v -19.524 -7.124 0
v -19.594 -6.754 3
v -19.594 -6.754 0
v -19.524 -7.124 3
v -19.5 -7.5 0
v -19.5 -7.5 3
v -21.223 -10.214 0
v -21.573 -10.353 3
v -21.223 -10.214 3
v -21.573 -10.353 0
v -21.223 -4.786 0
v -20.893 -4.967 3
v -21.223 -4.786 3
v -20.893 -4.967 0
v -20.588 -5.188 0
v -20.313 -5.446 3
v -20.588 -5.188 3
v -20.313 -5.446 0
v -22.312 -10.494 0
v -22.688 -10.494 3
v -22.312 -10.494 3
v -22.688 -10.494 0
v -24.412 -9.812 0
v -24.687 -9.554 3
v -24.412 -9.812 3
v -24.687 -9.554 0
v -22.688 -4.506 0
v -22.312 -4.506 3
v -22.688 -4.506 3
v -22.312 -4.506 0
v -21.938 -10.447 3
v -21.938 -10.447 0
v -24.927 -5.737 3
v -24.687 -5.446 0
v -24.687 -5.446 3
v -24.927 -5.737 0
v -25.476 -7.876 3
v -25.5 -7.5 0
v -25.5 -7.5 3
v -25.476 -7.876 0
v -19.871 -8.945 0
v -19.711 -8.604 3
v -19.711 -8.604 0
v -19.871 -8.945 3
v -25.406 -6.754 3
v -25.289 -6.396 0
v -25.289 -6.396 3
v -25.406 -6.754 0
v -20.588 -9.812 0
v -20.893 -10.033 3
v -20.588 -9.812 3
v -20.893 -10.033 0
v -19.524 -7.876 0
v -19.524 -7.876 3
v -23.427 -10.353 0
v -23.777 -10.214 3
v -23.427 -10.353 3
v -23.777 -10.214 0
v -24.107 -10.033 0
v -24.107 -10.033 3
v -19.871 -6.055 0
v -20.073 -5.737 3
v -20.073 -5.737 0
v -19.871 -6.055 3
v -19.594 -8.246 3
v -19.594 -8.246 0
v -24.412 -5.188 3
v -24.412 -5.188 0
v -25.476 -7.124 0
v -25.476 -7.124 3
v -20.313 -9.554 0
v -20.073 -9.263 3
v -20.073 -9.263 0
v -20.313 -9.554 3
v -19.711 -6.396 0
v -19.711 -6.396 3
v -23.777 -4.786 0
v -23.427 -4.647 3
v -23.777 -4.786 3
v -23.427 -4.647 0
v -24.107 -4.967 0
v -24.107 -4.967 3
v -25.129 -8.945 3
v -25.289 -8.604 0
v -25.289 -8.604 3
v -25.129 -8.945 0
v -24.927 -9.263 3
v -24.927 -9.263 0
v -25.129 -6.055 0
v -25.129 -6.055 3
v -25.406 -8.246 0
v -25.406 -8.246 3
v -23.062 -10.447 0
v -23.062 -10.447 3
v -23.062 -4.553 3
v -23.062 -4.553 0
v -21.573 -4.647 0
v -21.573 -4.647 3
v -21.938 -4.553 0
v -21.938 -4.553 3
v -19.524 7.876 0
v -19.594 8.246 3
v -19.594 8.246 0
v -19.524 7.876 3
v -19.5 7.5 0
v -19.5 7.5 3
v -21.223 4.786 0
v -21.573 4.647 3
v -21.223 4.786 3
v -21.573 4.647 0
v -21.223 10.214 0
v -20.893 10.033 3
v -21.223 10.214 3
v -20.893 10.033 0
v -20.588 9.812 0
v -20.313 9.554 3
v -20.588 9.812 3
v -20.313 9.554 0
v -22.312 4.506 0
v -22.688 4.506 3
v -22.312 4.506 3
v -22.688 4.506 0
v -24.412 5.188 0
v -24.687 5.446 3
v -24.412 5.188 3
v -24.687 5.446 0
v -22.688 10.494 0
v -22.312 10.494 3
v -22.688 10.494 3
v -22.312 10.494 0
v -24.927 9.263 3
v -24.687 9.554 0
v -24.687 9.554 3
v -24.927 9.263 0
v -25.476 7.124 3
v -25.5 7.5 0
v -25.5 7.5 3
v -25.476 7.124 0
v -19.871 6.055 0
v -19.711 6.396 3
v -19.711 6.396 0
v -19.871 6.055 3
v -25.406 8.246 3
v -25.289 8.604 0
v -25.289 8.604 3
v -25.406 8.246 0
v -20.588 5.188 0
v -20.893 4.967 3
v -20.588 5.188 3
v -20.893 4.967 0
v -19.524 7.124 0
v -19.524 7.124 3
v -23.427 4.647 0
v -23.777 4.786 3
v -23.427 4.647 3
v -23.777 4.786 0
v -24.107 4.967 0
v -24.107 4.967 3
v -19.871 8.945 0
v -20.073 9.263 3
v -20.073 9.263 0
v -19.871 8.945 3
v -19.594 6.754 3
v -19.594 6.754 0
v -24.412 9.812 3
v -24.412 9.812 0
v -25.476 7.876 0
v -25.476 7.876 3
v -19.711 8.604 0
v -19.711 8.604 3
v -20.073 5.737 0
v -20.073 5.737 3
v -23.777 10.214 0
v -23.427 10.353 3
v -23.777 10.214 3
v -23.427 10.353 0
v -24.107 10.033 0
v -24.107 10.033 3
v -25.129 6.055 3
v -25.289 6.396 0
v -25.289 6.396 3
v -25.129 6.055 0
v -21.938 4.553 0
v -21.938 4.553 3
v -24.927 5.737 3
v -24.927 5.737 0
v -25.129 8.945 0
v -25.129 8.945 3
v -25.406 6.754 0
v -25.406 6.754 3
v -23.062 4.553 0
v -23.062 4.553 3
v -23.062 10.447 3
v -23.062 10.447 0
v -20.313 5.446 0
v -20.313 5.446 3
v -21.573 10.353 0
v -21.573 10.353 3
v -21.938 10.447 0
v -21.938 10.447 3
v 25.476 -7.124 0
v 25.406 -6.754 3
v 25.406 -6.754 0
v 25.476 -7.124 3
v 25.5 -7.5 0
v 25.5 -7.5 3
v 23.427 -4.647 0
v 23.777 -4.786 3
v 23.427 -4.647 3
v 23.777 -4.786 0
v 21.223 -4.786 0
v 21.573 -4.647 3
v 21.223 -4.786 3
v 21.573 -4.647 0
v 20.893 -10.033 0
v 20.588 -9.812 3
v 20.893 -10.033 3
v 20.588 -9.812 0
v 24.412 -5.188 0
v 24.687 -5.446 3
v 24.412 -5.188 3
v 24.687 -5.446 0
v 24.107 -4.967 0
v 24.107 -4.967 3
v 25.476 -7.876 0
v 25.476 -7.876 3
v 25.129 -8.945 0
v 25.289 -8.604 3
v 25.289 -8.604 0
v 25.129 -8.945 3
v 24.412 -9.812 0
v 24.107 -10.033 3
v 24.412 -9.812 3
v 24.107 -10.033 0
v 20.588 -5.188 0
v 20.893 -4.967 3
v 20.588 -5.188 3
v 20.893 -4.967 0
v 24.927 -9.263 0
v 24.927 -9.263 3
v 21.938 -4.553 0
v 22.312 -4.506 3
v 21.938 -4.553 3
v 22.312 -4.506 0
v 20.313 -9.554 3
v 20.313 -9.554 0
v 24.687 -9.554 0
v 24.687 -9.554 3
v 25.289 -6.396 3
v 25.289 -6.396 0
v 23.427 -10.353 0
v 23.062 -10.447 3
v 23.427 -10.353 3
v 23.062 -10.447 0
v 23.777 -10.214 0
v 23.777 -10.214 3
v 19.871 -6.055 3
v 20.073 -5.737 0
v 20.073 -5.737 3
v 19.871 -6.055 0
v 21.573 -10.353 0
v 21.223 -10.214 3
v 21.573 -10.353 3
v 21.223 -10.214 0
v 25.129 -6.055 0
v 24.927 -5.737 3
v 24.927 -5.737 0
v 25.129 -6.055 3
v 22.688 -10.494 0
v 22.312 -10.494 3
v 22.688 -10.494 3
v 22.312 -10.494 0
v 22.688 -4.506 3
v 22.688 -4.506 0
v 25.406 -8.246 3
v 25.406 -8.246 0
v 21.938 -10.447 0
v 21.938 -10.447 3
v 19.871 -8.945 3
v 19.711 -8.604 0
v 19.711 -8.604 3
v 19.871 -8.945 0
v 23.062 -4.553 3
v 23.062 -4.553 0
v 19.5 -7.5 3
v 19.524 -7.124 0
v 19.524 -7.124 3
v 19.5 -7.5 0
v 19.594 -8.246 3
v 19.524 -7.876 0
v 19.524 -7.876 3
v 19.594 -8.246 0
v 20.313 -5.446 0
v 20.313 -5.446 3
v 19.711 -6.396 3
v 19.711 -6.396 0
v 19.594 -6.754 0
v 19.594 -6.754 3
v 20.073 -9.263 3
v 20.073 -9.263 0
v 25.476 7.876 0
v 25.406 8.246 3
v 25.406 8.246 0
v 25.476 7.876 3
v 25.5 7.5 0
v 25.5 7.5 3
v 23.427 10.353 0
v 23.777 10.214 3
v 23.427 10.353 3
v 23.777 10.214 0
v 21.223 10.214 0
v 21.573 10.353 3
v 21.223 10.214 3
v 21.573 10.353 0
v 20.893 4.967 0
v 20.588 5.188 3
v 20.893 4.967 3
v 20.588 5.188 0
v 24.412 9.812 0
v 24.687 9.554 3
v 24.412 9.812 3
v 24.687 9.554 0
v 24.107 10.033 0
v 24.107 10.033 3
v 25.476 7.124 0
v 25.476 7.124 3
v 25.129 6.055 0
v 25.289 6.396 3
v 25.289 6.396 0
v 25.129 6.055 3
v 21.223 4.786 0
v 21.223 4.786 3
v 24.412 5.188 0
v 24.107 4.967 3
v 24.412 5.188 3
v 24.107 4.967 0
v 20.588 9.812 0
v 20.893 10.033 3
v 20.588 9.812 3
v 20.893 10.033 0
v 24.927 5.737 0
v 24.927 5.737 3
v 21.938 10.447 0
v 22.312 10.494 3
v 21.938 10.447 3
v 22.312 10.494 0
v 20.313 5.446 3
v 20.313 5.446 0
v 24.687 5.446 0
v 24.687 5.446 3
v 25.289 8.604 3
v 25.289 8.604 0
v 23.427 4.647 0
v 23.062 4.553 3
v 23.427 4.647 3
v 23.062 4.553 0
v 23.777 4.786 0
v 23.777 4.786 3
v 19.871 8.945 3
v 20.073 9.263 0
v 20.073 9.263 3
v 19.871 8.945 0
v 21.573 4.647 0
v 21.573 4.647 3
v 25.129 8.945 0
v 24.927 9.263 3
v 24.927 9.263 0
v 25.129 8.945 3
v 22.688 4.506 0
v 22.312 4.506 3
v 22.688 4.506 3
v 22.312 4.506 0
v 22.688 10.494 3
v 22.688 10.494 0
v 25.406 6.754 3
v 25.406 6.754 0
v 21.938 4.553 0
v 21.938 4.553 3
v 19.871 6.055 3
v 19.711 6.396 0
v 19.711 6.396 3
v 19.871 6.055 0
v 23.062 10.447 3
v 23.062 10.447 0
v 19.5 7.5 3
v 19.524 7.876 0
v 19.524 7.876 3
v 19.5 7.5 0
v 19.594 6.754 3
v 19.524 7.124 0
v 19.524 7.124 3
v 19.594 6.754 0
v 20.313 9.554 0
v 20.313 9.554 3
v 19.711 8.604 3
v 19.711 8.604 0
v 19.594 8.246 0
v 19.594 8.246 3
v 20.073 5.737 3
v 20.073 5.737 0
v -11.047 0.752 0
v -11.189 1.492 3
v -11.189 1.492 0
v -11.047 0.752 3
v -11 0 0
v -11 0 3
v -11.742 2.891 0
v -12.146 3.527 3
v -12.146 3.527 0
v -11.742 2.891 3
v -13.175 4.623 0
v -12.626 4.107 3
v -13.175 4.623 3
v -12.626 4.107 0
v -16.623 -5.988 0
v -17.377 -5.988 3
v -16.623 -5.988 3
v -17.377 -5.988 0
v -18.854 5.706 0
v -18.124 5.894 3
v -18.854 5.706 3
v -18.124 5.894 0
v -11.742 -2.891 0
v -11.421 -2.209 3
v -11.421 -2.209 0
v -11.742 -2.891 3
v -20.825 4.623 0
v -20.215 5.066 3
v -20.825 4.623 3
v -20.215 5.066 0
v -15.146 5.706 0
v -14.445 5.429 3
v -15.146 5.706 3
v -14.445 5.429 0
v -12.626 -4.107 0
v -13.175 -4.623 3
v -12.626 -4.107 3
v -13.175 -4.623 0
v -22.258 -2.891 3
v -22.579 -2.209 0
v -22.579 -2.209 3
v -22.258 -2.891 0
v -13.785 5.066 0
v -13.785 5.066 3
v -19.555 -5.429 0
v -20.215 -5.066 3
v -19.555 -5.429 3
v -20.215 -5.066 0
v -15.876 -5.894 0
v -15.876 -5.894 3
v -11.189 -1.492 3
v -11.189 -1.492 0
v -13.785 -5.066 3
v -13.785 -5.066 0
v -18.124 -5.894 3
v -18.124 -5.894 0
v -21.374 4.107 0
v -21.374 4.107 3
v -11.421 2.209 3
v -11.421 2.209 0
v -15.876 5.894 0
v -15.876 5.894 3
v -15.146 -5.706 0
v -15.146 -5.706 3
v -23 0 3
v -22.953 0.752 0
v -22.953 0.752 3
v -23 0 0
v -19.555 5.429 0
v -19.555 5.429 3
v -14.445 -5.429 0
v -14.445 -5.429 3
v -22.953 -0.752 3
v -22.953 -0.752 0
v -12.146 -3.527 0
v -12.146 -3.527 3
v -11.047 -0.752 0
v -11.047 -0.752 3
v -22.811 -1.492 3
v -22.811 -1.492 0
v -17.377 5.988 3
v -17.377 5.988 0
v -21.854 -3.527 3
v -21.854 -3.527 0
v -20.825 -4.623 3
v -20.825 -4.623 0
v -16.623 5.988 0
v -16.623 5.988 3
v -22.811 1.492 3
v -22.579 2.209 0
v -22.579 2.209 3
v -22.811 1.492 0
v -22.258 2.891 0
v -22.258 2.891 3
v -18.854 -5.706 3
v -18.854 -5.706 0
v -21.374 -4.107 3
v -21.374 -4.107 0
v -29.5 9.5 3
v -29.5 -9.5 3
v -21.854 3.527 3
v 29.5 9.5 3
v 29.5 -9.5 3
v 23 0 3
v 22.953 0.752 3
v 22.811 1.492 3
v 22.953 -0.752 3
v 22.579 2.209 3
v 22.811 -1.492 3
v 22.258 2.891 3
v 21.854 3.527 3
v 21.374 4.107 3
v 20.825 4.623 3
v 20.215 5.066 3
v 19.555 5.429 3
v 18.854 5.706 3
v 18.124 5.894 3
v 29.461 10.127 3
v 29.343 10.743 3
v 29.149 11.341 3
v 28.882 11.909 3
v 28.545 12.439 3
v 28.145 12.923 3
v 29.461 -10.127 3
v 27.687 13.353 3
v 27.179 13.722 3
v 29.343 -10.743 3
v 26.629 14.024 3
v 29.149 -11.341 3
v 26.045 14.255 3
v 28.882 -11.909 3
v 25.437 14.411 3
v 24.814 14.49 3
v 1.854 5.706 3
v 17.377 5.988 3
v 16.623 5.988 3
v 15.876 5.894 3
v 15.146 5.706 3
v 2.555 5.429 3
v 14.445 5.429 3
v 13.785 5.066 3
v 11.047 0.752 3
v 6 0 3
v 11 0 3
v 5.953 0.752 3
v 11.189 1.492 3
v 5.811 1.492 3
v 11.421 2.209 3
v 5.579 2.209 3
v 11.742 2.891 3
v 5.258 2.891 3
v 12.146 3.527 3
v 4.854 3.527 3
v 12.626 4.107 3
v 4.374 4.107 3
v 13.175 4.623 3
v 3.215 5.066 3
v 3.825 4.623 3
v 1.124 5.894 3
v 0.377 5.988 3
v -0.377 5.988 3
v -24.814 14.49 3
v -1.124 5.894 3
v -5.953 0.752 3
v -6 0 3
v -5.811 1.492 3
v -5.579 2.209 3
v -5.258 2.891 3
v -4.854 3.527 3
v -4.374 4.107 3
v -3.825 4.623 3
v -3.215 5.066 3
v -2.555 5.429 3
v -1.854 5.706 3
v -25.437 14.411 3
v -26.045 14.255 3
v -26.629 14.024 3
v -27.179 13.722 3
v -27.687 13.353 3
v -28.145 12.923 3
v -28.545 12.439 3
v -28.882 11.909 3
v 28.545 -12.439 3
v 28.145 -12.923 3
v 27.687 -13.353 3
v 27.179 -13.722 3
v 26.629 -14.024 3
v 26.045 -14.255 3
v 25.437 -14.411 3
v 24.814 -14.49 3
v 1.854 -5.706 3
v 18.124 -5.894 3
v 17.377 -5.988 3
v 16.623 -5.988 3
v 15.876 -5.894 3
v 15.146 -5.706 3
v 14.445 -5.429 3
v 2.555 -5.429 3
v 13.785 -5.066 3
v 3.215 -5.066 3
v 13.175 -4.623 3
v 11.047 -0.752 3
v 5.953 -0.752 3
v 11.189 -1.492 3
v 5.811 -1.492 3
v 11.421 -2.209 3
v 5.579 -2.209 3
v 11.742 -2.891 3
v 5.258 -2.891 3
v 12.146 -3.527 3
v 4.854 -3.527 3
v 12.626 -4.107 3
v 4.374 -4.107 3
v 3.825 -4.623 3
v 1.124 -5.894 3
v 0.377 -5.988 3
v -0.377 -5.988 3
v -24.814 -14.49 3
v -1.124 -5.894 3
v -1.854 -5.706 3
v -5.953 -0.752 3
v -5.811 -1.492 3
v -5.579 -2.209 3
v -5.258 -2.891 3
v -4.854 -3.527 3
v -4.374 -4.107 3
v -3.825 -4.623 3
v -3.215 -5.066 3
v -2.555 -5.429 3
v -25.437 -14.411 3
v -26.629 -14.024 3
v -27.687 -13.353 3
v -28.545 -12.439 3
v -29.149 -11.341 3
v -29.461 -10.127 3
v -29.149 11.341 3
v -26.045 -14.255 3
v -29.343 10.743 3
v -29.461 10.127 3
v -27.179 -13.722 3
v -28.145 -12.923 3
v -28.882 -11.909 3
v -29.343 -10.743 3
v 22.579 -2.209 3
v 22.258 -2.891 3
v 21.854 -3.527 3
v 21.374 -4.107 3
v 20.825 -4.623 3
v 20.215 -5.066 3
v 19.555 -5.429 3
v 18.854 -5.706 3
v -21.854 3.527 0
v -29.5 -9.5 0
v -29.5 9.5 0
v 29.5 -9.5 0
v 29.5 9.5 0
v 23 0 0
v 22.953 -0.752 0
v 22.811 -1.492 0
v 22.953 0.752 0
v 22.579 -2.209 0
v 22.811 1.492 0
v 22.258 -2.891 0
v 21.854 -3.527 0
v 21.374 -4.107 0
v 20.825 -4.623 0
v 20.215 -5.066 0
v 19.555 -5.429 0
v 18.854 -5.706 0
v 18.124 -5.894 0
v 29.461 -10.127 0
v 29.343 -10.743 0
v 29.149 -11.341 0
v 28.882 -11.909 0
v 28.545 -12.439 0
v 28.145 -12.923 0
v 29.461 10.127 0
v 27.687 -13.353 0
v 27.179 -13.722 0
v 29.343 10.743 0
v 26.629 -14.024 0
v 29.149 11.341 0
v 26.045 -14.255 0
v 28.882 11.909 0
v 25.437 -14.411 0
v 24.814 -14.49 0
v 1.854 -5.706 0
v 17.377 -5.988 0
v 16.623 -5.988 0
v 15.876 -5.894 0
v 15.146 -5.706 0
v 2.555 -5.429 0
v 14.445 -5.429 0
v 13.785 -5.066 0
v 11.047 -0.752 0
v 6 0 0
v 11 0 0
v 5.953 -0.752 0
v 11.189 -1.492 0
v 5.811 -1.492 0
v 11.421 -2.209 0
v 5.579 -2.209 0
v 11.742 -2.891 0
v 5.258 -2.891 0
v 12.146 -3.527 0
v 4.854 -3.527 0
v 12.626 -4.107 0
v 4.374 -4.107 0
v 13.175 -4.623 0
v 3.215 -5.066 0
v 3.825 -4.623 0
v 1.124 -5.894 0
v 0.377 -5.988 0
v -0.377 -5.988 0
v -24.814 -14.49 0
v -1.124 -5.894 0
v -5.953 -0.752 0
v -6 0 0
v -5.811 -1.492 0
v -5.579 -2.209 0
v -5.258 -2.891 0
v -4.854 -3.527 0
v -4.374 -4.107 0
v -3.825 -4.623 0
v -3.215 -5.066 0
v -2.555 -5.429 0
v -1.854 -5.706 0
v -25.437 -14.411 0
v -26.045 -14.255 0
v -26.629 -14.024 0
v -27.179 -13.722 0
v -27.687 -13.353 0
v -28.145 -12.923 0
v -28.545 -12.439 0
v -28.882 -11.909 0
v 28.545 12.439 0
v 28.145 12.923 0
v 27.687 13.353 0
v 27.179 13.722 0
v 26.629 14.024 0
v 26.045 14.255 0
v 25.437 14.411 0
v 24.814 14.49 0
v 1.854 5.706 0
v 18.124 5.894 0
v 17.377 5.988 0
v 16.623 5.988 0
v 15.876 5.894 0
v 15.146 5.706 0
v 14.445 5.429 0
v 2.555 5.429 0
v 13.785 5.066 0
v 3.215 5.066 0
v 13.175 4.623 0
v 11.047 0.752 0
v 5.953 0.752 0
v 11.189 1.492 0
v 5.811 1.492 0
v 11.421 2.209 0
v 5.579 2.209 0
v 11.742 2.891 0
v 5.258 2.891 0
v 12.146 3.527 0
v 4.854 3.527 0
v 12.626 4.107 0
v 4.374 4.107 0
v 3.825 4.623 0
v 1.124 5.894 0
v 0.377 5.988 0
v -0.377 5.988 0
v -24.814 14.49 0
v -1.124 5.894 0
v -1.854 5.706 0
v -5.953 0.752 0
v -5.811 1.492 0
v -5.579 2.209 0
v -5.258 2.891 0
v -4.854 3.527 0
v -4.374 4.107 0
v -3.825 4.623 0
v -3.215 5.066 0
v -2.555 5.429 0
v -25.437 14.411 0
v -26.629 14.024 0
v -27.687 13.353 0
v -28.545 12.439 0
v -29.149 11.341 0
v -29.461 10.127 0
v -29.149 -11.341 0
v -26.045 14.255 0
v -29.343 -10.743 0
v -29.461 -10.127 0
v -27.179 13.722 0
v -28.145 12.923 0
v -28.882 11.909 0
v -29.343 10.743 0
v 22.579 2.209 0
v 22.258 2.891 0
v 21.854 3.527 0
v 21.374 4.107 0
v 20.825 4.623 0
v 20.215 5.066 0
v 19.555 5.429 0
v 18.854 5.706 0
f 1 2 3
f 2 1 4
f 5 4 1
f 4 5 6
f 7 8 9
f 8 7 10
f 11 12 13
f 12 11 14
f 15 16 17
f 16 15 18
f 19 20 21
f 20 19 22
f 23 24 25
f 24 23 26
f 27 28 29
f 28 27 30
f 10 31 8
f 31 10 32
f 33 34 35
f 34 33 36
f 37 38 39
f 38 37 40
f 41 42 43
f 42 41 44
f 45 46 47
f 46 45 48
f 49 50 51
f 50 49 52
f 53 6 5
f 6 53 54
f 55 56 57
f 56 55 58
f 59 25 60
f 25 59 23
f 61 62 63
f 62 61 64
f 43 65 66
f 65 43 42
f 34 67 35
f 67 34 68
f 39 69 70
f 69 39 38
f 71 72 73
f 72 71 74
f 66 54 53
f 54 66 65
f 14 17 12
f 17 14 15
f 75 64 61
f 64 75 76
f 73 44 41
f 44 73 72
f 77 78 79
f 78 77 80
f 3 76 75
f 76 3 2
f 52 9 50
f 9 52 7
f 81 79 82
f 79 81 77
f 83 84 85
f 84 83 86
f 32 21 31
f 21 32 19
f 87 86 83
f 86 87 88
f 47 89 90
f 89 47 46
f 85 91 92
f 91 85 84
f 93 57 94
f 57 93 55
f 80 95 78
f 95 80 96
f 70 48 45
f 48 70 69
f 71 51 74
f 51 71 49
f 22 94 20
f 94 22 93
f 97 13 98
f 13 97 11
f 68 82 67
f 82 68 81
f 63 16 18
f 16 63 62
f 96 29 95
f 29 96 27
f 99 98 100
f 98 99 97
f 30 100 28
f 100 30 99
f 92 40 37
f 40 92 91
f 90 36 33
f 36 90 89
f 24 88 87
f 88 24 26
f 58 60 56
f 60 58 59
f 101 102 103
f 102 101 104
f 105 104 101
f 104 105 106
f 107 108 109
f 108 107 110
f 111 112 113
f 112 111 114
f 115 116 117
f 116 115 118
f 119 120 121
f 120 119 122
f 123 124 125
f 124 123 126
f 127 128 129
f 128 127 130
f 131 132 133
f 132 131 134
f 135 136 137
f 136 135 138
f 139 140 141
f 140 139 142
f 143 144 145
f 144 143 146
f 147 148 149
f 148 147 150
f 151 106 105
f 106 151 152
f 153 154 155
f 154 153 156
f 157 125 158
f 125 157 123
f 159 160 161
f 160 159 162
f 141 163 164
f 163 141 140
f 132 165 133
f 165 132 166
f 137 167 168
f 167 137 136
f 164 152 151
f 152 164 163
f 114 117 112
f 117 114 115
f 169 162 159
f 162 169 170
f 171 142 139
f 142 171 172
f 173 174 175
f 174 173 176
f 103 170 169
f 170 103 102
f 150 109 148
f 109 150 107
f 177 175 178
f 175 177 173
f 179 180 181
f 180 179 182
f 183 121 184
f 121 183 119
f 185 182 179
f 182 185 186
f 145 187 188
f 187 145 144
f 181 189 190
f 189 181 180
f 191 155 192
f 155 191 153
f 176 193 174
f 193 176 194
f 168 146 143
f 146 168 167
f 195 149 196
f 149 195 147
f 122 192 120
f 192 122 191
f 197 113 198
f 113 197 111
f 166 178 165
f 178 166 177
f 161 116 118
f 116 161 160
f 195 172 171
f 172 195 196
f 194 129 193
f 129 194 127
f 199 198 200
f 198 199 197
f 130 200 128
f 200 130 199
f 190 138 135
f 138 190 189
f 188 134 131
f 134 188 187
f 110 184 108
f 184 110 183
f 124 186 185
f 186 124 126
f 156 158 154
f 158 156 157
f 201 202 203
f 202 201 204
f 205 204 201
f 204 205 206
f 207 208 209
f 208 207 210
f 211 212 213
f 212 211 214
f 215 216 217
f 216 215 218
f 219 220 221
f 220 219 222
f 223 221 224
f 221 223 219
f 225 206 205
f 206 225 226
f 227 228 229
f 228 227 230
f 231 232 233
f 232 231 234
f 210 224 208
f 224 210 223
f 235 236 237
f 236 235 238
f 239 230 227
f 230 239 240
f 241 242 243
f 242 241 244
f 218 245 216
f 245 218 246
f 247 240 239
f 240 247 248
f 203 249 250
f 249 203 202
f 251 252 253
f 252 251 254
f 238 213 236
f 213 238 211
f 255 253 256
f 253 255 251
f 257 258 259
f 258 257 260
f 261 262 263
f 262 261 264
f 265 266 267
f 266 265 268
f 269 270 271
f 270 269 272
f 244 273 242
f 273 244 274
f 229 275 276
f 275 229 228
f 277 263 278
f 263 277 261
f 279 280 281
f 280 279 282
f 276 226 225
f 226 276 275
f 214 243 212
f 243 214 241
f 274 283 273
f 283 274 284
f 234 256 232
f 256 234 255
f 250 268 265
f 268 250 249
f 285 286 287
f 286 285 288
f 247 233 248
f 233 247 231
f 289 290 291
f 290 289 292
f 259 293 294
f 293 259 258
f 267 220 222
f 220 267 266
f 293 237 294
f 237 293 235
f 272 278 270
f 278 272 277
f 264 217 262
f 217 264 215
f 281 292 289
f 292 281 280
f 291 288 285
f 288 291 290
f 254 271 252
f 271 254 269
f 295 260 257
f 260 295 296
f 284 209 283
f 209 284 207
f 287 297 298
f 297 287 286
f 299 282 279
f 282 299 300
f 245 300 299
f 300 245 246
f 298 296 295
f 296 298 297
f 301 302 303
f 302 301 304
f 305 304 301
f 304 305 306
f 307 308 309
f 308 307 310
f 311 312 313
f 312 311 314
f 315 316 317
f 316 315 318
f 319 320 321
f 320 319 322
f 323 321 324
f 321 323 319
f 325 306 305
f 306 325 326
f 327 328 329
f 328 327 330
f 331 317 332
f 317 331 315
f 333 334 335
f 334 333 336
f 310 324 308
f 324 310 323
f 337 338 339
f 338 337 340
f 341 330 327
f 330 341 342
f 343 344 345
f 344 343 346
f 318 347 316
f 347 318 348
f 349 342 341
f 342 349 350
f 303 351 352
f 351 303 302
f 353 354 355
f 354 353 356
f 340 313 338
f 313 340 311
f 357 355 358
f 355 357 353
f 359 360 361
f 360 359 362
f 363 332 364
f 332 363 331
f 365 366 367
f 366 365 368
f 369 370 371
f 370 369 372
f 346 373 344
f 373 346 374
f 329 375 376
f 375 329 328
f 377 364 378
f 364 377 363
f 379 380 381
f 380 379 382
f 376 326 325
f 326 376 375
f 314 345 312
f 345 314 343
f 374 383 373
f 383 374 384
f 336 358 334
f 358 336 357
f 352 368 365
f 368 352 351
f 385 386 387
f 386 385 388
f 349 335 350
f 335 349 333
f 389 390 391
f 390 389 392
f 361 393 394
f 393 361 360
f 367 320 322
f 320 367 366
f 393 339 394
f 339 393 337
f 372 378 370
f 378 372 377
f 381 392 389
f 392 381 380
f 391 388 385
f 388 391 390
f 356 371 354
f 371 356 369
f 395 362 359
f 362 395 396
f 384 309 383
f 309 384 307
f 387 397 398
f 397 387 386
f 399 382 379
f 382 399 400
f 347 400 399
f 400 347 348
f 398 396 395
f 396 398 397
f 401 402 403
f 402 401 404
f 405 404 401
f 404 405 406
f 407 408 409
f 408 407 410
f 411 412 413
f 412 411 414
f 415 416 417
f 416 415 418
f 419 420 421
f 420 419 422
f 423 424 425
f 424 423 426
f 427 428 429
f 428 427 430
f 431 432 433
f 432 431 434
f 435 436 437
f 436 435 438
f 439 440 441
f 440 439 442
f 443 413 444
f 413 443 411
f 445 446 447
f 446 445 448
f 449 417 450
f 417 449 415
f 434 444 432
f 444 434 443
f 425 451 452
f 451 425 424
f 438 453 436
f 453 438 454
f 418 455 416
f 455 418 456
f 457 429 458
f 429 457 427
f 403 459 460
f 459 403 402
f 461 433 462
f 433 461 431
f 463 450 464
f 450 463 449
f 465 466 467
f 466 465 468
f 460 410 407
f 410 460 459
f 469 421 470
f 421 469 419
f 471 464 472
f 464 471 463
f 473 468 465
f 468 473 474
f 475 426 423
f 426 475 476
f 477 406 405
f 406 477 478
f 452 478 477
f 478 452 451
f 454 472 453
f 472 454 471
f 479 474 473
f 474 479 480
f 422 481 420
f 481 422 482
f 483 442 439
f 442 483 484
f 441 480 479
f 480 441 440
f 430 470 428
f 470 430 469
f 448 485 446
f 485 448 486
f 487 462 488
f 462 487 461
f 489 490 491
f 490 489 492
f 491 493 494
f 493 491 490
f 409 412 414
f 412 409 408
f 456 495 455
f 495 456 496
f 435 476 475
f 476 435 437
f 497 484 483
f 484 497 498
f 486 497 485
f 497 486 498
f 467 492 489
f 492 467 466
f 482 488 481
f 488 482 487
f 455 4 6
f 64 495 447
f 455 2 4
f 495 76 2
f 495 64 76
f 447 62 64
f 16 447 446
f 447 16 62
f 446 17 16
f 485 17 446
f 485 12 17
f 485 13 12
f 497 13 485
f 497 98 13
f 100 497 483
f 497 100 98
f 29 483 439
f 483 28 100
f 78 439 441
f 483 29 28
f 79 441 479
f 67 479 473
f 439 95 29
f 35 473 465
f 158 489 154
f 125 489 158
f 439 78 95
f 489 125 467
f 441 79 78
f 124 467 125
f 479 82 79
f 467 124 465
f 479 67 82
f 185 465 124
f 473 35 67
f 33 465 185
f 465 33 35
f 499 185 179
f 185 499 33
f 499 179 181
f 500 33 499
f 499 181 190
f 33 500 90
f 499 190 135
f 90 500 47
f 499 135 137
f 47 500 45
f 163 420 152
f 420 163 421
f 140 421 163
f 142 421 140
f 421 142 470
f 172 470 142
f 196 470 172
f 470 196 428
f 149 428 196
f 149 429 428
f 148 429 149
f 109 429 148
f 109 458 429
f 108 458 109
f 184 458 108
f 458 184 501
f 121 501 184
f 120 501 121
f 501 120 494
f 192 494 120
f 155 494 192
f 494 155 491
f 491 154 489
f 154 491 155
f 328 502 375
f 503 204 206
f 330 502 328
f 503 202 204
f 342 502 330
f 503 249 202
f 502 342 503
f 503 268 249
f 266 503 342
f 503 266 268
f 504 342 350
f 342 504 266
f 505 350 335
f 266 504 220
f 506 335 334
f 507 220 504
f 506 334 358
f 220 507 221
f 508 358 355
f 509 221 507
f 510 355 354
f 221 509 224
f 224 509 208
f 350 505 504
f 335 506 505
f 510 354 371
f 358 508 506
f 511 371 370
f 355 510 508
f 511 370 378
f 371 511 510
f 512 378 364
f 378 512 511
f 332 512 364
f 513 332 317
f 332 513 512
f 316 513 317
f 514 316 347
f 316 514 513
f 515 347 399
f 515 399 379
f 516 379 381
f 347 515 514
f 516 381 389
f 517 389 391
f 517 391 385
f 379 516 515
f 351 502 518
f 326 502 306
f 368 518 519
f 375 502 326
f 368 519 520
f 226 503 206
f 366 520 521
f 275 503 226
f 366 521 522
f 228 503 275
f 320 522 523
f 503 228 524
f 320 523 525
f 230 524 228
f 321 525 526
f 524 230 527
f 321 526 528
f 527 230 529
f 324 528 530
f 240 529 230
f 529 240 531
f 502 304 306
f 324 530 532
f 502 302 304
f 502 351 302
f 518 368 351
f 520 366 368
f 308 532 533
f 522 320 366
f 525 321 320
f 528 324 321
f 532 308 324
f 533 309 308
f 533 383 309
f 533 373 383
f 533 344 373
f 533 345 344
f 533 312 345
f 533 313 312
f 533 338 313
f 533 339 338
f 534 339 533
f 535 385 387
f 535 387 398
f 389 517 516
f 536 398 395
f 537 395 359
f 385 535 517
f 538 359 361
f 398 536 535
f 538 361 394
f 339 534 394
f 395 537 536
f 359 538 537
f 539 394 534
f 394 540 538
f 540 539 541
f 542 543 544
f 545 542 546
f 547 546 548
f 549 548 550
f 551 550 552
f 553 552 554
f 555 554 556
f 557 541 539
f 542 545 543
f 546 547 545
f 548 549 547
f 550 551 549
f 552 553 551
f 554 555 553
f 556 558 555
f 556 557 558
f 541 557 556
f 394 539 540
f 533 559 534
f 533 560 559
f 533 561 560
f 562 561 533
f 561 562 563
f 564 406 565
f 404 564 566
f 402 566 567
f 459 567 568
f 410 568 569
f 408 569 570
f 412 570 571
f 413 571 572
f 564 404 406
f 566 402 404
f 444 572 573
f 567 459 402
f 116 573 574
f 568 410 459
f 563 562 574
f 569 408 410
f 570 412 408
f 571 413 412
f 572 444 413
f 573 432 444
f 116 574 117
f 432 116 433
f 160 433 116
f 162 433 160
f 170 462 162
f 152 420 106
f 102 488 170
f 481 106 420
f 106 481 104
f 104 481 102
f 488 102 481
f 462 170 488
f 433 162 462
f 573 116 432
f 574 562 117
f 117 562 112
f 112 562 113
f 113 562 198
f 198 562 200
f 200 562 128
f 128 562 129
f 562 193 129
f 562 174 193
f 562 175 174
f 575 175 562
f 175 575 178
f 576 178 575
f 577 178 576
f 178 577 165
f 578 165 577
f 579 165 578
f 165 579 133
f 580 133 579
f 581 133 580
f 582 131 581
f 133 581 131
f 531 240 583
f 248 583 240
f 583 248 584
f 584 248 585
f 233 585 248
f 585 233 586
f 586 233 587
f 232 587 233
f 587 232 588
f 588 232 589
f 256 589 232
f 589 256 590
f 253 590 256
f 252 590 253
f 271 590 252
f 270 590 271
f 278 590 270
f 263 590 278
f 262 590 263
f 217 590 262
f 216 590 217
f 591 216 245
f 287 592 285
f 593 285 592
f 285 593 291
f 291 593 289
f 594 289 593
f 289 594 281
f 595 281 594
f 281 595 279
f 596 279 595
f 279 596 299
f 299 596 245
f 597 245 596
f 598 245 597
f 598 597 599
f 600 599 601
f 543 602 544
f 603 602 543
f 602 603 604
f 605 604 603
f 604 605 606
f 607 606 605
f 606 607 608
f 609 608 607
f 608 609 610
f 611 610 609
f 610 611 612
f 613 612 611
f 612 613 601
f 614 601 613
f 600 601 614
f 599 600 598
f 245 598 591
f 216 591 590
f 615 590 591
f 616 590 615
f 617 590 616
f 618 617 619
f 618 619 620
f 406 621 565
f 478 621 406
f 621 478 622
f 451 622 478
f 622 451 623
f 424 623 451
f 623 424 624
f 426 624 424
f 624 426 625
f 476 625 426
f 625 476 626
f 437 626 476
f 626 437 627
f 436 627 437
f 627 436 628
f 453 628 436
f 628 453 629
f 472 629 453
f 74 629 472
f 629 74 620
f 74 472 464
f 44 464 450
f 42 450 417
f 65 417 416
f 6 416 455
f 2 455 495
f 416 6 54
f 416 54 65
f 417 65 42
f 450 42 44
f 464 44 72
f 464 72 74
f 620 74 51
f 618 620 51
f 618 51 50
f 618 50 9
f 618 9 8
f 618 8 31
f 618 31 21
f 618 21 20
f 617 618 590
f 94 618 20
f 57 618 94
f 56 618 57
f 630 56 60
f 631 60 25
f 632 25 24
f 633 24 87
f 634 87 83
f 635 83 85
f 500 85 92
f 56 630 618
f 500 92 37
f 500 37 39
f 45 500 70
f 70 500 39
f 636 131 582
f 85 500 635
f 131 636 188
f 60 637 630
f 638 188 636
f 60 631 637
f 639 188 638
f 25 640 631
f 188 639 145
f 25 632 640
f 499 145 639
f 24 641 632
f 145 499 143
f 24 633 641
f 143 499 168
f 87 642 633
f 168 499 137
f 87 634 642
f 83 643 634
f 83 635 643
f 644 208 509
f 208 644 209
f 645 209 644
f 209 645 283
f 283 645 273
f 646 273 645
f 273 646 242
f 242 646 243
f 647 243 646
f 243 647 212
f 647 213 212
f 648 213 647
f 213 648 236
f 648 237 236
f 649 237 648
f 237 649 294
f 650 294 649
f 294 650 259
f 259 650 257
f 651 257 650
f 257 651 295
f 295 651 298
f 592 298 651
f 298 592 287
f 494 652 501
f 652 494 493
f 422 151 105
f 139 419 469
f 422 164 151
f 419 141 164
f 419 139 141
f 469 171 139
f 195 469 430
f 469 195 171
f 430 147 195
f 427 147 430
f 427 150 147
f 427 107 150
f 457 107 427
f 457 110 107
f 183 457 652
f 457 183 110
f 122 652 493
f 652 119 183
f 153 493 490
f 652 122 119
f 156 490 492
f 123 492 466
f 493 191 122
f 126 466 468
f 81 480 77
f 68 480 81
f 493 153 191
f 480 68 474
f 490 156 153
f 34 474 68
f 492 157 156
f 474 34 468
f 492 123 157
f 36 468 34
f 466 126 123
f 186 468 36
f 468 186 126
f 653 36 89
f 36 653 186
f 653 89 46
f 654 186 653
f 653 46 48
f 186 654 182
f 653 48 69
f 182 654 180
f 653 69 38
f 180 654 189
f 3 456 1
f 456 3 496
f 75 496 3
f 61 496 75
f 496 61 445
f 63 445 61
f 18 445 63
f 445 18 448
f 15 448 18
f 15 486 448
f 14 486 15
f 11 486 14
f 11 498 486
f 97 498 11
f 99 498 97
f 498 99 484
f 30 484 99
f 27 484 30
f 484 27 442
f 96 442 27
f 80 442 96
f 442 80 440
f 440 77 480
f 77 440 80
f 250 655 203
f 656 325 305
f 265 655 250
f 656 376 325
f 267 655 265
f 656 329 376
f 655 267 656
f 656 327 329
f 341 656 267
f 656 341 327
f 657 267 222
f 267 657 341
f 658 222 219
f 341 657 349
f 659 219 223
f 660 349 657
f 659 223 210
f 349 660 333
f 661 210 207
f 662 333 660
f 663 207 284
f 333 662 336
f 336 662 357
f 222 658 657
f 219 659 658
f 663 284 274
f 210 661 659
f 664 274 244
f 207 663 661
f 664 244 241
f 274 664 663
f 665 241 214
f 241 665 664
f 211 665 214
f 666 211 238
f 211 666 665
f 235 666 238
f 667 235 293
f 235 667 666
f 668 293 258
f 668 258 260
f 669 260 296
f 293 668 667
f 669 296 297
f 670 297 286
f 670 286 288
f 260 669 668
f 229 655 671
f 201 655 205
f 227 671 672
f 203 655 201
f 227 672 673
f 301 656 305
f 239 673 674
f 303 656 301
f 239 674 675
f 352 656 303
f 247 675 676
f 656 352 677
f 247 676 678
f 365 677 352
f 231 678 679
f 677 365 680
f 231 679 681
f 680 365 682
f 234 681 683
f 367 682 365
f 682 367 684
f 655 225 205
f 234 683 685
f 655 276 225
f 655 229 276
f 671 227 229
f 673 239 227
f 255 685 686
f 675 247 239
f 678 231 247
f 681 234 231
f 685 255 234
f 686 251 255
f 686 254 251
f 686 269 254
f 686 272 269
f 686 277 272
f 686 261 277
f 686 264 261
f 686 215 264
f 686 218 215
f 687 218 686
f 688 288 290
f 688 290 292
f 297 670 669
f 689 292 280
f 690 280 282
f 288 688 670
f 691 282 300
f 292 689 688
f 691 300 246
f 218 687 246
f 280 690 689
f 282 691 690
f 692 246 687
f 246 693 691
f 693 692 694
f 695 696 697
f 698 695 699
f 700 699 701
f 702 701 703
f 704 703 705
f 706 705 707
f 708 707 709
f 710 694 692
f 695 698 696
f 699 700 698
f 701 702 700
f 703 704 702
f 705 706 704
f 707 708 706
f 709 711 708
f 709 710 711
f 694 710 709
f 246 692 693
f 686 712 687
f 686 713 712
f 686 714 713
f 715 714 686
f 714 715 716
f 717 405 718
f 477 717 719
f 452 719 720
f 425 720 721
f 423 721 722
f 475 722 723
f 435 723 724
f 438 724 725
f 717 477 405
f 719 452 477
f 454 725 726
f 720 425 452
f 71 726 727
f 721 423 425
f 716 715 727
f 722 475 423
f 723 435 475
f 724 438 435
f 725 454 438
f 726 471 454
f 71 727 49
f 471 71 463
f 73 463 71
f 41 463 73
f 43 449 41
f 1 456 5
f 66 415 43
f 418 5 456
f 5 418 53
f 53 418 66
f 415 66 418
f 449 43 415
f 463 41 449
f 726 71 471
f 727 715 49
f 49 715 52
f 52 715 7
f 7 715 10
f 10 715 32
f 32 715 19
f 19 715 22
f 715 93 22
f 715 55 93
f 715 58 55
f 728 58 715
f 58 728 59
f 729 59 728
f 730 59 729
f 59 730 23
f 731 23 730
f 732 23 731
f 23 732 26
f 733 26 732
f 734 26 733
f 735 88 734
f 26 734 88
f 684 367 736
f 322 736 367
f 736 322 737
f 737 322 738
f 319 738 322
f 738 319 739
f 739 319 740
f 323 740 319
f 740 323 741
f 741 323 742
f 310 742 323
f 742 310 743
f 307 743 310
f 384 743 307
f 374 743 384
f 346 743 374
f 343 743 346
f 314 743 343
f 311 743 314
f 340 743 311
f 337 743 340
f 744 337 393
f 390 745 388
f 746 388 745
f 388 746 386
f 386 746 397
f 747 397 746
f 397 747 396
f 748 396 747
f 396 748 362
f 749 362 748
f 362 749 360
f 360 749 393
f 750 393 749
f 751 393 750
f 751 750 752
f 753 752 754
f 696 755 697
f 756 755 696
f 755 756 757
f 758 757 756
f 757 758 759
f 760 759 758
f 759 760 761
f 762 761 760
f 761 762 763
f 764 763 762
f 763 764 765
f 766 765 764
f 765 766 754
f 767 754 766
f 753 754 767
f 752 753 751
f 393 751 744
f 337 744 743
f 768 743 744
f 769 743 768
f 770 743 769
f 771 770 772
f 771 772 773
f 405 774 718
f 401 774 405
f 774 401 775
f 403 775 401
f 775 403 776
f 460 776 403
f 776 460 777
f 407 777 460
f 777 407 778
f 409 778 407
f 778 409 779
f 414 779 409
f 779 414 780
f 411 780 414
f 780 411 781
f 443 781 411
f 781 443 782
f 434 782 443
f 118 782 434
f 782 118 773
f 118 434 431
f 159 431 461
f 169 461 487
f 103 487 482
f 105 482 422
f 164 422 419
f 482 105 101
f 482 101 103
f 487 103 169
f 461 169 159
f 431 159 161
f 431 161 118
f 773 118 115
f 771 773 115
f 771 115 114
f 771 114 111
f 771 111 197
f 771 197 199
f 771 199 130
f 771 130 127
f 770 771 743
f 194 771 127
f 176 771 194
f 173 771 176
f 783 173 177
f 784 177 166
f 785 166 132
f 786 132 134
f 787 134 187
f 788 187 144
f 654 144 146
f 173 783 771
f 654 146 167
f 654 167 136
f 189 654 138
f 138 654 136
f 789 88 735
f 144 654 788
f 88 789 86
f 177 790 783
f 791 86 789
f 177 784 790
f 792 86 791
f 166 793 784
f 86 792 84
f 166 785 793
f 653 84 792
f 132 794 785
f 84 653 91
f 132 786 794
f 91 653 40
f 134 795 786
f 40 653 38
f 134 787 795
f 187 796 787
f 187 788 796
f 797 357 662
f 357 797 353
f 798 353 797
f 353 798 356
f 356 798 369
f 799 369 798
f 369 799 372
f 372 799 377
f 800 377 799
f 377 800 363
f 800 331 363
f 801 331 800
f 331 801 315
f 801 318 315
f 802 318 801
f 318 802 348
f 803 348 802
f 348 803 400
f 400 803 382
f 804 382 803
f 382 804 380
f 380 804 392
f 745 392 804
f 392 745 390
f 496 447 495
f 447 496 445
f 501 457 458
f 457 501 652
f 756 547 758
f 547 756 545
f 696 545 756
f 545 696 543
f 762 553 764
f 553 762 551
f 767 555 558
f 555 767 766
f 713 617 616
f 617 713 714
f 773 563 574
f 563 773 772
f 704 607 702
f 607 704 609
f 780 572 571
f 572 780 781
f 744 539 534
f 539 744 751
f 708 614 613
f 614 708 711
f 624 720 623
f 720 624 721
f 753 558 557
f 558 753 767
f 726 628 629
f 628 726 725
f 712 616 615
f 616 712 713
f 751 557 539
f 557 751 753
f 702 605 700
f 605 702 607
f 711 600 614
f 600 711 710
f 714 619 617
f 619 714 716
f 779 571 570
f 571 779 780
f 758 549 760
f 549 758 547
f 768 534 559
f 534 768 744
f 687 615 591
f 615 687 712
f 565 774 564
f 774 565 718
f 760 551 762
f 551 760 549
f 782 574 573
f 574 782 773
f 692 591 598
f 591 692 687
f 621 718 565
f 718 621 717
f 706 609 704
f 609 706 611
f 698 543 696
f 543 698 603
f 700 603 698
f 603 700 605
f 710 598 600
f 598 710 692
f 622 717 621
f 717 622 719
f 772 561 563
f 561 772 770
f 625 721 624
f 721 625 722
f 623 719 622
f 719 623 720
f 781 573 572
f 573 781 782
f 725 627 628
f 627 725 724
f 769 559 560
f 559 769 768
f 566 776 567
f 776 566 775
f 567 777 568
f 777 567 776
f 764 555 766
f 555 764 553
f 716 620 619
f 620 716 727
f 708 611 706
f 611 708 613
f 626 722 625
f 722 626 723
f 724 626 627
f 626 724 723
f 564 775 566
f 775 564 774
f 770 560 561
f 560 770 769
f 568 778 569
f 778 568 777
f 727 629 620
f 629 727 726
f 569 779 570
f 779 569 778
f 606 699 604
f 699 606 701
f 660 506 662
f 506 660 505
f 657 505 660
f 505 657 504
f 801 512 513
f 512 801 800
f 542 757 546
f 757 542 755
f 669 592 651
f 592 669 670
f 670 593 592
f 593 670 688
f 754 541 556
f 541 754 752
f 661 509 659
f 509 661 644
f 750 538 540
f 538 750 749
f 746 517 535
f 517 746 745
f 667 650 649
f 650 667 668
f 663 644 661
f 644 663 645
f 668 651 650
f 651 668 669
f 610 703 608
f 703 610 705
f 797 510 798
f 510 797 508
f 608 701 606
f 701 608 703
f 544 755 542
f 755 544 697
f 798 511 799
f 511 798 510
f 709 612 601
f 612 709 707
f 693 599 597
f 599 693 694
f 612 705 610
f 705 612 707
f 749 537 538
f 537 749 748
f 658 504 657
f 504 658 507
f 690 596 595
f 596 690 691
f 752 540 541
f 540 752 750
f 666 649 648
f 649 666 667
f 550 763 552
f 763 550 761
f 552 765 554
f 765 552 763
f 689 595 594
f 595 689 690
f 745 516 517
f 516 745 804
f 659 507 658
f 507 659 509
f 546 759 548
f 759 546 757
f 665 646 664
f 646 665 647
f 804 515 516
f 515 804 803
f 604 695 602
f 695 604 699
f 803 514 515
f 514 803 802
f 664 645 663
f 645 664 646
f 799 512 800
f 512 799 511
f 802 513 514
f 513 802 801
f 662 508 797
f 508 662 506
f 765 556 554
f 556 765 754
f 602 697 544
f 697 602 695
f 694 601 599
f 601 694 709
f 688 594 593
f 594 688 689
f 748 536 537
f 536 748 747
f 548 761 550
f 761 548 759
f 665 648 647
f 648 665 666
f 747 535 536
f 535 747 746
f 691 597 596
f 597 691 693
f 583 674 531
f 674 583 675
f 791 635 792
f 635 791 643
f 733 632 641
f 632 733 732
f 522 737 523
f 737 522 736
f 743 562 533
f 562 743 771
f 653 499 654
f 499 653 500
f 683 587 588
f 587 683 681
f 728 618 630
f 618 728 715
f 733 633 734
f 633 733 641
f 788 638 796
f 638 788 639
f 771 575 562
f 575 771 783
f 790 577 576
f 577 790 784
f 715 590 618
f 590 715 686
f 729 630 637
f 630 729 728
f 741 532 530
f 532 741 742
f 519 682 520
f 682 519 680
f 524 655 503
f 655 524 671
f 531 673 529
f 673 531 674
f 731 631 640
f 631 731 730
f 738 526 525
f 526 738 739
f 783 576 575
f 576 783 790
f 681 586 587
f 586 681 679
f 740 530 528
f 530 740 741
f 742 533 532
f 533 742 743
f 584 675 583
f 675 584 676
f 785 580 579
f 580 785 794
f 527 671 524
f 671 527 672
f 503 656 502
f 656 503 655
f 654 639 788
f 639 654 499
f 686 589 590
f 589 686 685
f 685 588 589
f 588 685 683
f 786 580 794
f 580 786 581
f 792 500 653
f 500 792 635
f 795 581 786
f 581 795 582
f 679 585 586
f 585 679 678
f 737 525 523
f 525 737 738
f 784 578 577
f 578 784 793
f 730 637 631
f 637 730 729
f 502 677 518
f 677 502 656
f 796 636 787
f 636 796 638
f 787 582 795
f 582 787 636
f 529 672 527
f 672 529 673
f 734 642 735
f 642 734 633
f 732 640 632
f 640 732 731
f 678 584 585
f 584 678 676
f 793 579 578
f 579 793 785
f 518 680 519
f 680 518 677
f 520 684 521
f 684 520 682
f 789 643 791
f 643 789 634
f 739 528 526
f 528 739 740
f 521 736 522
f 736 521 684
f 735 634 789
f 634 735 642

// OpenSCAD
$fn = 50;


difference() {
	union() {
		hull() {
			translate(v = [-24.5000000000, 9.5000000000, 0]) {
				cylinder(h = 3, r = 5);
			}
			translate(v = [24.5000000000, 9.5000000000, 0]) {
				cylinder(h = 3, r = 5);
			}
			translate(v = [-24.5000000000, -9.5000000000, 0]) {
				cylinder(h = 3, r = 5);
			}
			translate(v = [24.5000000000, -9.5000000000, 0]) {
				cylinder(h = 3, r = 5);
			}
		}
	}
	union() {
		#translate(v = [-22.5000000000, -7.5000000000, -100.0000000000]) {
			cylinder(h = 200, r = 3.0000000000);
		}
		#translate(v = [-22.5000000000, 7.5000000000, -100.0000000000]) {
			cylinder(h = 200, r = 3.0000000000);
		}
		#translate(v = [22.5000000000, -7.5000000000, -100.0000000000]) {
			cylinder(h = 200, r = 3.0000000000);
		}
		#translate(v = [22.5000000000, 7.5000000000, -100.0000000000]) {
			cylinder(h = 200, r = 3.0000000000);
		}
		#translate(v = [-17.0000000000, 0, 0]) {
			cylinder(h = 3, r = 6.0000000000);
		}
		#cylinder(h = 3, r = 6.0000000000);
		#translate(v = [17.0000000000, 0, 0]) {
			cylinder(h = 3, r = 6.0000000000);
		}
	}
}
